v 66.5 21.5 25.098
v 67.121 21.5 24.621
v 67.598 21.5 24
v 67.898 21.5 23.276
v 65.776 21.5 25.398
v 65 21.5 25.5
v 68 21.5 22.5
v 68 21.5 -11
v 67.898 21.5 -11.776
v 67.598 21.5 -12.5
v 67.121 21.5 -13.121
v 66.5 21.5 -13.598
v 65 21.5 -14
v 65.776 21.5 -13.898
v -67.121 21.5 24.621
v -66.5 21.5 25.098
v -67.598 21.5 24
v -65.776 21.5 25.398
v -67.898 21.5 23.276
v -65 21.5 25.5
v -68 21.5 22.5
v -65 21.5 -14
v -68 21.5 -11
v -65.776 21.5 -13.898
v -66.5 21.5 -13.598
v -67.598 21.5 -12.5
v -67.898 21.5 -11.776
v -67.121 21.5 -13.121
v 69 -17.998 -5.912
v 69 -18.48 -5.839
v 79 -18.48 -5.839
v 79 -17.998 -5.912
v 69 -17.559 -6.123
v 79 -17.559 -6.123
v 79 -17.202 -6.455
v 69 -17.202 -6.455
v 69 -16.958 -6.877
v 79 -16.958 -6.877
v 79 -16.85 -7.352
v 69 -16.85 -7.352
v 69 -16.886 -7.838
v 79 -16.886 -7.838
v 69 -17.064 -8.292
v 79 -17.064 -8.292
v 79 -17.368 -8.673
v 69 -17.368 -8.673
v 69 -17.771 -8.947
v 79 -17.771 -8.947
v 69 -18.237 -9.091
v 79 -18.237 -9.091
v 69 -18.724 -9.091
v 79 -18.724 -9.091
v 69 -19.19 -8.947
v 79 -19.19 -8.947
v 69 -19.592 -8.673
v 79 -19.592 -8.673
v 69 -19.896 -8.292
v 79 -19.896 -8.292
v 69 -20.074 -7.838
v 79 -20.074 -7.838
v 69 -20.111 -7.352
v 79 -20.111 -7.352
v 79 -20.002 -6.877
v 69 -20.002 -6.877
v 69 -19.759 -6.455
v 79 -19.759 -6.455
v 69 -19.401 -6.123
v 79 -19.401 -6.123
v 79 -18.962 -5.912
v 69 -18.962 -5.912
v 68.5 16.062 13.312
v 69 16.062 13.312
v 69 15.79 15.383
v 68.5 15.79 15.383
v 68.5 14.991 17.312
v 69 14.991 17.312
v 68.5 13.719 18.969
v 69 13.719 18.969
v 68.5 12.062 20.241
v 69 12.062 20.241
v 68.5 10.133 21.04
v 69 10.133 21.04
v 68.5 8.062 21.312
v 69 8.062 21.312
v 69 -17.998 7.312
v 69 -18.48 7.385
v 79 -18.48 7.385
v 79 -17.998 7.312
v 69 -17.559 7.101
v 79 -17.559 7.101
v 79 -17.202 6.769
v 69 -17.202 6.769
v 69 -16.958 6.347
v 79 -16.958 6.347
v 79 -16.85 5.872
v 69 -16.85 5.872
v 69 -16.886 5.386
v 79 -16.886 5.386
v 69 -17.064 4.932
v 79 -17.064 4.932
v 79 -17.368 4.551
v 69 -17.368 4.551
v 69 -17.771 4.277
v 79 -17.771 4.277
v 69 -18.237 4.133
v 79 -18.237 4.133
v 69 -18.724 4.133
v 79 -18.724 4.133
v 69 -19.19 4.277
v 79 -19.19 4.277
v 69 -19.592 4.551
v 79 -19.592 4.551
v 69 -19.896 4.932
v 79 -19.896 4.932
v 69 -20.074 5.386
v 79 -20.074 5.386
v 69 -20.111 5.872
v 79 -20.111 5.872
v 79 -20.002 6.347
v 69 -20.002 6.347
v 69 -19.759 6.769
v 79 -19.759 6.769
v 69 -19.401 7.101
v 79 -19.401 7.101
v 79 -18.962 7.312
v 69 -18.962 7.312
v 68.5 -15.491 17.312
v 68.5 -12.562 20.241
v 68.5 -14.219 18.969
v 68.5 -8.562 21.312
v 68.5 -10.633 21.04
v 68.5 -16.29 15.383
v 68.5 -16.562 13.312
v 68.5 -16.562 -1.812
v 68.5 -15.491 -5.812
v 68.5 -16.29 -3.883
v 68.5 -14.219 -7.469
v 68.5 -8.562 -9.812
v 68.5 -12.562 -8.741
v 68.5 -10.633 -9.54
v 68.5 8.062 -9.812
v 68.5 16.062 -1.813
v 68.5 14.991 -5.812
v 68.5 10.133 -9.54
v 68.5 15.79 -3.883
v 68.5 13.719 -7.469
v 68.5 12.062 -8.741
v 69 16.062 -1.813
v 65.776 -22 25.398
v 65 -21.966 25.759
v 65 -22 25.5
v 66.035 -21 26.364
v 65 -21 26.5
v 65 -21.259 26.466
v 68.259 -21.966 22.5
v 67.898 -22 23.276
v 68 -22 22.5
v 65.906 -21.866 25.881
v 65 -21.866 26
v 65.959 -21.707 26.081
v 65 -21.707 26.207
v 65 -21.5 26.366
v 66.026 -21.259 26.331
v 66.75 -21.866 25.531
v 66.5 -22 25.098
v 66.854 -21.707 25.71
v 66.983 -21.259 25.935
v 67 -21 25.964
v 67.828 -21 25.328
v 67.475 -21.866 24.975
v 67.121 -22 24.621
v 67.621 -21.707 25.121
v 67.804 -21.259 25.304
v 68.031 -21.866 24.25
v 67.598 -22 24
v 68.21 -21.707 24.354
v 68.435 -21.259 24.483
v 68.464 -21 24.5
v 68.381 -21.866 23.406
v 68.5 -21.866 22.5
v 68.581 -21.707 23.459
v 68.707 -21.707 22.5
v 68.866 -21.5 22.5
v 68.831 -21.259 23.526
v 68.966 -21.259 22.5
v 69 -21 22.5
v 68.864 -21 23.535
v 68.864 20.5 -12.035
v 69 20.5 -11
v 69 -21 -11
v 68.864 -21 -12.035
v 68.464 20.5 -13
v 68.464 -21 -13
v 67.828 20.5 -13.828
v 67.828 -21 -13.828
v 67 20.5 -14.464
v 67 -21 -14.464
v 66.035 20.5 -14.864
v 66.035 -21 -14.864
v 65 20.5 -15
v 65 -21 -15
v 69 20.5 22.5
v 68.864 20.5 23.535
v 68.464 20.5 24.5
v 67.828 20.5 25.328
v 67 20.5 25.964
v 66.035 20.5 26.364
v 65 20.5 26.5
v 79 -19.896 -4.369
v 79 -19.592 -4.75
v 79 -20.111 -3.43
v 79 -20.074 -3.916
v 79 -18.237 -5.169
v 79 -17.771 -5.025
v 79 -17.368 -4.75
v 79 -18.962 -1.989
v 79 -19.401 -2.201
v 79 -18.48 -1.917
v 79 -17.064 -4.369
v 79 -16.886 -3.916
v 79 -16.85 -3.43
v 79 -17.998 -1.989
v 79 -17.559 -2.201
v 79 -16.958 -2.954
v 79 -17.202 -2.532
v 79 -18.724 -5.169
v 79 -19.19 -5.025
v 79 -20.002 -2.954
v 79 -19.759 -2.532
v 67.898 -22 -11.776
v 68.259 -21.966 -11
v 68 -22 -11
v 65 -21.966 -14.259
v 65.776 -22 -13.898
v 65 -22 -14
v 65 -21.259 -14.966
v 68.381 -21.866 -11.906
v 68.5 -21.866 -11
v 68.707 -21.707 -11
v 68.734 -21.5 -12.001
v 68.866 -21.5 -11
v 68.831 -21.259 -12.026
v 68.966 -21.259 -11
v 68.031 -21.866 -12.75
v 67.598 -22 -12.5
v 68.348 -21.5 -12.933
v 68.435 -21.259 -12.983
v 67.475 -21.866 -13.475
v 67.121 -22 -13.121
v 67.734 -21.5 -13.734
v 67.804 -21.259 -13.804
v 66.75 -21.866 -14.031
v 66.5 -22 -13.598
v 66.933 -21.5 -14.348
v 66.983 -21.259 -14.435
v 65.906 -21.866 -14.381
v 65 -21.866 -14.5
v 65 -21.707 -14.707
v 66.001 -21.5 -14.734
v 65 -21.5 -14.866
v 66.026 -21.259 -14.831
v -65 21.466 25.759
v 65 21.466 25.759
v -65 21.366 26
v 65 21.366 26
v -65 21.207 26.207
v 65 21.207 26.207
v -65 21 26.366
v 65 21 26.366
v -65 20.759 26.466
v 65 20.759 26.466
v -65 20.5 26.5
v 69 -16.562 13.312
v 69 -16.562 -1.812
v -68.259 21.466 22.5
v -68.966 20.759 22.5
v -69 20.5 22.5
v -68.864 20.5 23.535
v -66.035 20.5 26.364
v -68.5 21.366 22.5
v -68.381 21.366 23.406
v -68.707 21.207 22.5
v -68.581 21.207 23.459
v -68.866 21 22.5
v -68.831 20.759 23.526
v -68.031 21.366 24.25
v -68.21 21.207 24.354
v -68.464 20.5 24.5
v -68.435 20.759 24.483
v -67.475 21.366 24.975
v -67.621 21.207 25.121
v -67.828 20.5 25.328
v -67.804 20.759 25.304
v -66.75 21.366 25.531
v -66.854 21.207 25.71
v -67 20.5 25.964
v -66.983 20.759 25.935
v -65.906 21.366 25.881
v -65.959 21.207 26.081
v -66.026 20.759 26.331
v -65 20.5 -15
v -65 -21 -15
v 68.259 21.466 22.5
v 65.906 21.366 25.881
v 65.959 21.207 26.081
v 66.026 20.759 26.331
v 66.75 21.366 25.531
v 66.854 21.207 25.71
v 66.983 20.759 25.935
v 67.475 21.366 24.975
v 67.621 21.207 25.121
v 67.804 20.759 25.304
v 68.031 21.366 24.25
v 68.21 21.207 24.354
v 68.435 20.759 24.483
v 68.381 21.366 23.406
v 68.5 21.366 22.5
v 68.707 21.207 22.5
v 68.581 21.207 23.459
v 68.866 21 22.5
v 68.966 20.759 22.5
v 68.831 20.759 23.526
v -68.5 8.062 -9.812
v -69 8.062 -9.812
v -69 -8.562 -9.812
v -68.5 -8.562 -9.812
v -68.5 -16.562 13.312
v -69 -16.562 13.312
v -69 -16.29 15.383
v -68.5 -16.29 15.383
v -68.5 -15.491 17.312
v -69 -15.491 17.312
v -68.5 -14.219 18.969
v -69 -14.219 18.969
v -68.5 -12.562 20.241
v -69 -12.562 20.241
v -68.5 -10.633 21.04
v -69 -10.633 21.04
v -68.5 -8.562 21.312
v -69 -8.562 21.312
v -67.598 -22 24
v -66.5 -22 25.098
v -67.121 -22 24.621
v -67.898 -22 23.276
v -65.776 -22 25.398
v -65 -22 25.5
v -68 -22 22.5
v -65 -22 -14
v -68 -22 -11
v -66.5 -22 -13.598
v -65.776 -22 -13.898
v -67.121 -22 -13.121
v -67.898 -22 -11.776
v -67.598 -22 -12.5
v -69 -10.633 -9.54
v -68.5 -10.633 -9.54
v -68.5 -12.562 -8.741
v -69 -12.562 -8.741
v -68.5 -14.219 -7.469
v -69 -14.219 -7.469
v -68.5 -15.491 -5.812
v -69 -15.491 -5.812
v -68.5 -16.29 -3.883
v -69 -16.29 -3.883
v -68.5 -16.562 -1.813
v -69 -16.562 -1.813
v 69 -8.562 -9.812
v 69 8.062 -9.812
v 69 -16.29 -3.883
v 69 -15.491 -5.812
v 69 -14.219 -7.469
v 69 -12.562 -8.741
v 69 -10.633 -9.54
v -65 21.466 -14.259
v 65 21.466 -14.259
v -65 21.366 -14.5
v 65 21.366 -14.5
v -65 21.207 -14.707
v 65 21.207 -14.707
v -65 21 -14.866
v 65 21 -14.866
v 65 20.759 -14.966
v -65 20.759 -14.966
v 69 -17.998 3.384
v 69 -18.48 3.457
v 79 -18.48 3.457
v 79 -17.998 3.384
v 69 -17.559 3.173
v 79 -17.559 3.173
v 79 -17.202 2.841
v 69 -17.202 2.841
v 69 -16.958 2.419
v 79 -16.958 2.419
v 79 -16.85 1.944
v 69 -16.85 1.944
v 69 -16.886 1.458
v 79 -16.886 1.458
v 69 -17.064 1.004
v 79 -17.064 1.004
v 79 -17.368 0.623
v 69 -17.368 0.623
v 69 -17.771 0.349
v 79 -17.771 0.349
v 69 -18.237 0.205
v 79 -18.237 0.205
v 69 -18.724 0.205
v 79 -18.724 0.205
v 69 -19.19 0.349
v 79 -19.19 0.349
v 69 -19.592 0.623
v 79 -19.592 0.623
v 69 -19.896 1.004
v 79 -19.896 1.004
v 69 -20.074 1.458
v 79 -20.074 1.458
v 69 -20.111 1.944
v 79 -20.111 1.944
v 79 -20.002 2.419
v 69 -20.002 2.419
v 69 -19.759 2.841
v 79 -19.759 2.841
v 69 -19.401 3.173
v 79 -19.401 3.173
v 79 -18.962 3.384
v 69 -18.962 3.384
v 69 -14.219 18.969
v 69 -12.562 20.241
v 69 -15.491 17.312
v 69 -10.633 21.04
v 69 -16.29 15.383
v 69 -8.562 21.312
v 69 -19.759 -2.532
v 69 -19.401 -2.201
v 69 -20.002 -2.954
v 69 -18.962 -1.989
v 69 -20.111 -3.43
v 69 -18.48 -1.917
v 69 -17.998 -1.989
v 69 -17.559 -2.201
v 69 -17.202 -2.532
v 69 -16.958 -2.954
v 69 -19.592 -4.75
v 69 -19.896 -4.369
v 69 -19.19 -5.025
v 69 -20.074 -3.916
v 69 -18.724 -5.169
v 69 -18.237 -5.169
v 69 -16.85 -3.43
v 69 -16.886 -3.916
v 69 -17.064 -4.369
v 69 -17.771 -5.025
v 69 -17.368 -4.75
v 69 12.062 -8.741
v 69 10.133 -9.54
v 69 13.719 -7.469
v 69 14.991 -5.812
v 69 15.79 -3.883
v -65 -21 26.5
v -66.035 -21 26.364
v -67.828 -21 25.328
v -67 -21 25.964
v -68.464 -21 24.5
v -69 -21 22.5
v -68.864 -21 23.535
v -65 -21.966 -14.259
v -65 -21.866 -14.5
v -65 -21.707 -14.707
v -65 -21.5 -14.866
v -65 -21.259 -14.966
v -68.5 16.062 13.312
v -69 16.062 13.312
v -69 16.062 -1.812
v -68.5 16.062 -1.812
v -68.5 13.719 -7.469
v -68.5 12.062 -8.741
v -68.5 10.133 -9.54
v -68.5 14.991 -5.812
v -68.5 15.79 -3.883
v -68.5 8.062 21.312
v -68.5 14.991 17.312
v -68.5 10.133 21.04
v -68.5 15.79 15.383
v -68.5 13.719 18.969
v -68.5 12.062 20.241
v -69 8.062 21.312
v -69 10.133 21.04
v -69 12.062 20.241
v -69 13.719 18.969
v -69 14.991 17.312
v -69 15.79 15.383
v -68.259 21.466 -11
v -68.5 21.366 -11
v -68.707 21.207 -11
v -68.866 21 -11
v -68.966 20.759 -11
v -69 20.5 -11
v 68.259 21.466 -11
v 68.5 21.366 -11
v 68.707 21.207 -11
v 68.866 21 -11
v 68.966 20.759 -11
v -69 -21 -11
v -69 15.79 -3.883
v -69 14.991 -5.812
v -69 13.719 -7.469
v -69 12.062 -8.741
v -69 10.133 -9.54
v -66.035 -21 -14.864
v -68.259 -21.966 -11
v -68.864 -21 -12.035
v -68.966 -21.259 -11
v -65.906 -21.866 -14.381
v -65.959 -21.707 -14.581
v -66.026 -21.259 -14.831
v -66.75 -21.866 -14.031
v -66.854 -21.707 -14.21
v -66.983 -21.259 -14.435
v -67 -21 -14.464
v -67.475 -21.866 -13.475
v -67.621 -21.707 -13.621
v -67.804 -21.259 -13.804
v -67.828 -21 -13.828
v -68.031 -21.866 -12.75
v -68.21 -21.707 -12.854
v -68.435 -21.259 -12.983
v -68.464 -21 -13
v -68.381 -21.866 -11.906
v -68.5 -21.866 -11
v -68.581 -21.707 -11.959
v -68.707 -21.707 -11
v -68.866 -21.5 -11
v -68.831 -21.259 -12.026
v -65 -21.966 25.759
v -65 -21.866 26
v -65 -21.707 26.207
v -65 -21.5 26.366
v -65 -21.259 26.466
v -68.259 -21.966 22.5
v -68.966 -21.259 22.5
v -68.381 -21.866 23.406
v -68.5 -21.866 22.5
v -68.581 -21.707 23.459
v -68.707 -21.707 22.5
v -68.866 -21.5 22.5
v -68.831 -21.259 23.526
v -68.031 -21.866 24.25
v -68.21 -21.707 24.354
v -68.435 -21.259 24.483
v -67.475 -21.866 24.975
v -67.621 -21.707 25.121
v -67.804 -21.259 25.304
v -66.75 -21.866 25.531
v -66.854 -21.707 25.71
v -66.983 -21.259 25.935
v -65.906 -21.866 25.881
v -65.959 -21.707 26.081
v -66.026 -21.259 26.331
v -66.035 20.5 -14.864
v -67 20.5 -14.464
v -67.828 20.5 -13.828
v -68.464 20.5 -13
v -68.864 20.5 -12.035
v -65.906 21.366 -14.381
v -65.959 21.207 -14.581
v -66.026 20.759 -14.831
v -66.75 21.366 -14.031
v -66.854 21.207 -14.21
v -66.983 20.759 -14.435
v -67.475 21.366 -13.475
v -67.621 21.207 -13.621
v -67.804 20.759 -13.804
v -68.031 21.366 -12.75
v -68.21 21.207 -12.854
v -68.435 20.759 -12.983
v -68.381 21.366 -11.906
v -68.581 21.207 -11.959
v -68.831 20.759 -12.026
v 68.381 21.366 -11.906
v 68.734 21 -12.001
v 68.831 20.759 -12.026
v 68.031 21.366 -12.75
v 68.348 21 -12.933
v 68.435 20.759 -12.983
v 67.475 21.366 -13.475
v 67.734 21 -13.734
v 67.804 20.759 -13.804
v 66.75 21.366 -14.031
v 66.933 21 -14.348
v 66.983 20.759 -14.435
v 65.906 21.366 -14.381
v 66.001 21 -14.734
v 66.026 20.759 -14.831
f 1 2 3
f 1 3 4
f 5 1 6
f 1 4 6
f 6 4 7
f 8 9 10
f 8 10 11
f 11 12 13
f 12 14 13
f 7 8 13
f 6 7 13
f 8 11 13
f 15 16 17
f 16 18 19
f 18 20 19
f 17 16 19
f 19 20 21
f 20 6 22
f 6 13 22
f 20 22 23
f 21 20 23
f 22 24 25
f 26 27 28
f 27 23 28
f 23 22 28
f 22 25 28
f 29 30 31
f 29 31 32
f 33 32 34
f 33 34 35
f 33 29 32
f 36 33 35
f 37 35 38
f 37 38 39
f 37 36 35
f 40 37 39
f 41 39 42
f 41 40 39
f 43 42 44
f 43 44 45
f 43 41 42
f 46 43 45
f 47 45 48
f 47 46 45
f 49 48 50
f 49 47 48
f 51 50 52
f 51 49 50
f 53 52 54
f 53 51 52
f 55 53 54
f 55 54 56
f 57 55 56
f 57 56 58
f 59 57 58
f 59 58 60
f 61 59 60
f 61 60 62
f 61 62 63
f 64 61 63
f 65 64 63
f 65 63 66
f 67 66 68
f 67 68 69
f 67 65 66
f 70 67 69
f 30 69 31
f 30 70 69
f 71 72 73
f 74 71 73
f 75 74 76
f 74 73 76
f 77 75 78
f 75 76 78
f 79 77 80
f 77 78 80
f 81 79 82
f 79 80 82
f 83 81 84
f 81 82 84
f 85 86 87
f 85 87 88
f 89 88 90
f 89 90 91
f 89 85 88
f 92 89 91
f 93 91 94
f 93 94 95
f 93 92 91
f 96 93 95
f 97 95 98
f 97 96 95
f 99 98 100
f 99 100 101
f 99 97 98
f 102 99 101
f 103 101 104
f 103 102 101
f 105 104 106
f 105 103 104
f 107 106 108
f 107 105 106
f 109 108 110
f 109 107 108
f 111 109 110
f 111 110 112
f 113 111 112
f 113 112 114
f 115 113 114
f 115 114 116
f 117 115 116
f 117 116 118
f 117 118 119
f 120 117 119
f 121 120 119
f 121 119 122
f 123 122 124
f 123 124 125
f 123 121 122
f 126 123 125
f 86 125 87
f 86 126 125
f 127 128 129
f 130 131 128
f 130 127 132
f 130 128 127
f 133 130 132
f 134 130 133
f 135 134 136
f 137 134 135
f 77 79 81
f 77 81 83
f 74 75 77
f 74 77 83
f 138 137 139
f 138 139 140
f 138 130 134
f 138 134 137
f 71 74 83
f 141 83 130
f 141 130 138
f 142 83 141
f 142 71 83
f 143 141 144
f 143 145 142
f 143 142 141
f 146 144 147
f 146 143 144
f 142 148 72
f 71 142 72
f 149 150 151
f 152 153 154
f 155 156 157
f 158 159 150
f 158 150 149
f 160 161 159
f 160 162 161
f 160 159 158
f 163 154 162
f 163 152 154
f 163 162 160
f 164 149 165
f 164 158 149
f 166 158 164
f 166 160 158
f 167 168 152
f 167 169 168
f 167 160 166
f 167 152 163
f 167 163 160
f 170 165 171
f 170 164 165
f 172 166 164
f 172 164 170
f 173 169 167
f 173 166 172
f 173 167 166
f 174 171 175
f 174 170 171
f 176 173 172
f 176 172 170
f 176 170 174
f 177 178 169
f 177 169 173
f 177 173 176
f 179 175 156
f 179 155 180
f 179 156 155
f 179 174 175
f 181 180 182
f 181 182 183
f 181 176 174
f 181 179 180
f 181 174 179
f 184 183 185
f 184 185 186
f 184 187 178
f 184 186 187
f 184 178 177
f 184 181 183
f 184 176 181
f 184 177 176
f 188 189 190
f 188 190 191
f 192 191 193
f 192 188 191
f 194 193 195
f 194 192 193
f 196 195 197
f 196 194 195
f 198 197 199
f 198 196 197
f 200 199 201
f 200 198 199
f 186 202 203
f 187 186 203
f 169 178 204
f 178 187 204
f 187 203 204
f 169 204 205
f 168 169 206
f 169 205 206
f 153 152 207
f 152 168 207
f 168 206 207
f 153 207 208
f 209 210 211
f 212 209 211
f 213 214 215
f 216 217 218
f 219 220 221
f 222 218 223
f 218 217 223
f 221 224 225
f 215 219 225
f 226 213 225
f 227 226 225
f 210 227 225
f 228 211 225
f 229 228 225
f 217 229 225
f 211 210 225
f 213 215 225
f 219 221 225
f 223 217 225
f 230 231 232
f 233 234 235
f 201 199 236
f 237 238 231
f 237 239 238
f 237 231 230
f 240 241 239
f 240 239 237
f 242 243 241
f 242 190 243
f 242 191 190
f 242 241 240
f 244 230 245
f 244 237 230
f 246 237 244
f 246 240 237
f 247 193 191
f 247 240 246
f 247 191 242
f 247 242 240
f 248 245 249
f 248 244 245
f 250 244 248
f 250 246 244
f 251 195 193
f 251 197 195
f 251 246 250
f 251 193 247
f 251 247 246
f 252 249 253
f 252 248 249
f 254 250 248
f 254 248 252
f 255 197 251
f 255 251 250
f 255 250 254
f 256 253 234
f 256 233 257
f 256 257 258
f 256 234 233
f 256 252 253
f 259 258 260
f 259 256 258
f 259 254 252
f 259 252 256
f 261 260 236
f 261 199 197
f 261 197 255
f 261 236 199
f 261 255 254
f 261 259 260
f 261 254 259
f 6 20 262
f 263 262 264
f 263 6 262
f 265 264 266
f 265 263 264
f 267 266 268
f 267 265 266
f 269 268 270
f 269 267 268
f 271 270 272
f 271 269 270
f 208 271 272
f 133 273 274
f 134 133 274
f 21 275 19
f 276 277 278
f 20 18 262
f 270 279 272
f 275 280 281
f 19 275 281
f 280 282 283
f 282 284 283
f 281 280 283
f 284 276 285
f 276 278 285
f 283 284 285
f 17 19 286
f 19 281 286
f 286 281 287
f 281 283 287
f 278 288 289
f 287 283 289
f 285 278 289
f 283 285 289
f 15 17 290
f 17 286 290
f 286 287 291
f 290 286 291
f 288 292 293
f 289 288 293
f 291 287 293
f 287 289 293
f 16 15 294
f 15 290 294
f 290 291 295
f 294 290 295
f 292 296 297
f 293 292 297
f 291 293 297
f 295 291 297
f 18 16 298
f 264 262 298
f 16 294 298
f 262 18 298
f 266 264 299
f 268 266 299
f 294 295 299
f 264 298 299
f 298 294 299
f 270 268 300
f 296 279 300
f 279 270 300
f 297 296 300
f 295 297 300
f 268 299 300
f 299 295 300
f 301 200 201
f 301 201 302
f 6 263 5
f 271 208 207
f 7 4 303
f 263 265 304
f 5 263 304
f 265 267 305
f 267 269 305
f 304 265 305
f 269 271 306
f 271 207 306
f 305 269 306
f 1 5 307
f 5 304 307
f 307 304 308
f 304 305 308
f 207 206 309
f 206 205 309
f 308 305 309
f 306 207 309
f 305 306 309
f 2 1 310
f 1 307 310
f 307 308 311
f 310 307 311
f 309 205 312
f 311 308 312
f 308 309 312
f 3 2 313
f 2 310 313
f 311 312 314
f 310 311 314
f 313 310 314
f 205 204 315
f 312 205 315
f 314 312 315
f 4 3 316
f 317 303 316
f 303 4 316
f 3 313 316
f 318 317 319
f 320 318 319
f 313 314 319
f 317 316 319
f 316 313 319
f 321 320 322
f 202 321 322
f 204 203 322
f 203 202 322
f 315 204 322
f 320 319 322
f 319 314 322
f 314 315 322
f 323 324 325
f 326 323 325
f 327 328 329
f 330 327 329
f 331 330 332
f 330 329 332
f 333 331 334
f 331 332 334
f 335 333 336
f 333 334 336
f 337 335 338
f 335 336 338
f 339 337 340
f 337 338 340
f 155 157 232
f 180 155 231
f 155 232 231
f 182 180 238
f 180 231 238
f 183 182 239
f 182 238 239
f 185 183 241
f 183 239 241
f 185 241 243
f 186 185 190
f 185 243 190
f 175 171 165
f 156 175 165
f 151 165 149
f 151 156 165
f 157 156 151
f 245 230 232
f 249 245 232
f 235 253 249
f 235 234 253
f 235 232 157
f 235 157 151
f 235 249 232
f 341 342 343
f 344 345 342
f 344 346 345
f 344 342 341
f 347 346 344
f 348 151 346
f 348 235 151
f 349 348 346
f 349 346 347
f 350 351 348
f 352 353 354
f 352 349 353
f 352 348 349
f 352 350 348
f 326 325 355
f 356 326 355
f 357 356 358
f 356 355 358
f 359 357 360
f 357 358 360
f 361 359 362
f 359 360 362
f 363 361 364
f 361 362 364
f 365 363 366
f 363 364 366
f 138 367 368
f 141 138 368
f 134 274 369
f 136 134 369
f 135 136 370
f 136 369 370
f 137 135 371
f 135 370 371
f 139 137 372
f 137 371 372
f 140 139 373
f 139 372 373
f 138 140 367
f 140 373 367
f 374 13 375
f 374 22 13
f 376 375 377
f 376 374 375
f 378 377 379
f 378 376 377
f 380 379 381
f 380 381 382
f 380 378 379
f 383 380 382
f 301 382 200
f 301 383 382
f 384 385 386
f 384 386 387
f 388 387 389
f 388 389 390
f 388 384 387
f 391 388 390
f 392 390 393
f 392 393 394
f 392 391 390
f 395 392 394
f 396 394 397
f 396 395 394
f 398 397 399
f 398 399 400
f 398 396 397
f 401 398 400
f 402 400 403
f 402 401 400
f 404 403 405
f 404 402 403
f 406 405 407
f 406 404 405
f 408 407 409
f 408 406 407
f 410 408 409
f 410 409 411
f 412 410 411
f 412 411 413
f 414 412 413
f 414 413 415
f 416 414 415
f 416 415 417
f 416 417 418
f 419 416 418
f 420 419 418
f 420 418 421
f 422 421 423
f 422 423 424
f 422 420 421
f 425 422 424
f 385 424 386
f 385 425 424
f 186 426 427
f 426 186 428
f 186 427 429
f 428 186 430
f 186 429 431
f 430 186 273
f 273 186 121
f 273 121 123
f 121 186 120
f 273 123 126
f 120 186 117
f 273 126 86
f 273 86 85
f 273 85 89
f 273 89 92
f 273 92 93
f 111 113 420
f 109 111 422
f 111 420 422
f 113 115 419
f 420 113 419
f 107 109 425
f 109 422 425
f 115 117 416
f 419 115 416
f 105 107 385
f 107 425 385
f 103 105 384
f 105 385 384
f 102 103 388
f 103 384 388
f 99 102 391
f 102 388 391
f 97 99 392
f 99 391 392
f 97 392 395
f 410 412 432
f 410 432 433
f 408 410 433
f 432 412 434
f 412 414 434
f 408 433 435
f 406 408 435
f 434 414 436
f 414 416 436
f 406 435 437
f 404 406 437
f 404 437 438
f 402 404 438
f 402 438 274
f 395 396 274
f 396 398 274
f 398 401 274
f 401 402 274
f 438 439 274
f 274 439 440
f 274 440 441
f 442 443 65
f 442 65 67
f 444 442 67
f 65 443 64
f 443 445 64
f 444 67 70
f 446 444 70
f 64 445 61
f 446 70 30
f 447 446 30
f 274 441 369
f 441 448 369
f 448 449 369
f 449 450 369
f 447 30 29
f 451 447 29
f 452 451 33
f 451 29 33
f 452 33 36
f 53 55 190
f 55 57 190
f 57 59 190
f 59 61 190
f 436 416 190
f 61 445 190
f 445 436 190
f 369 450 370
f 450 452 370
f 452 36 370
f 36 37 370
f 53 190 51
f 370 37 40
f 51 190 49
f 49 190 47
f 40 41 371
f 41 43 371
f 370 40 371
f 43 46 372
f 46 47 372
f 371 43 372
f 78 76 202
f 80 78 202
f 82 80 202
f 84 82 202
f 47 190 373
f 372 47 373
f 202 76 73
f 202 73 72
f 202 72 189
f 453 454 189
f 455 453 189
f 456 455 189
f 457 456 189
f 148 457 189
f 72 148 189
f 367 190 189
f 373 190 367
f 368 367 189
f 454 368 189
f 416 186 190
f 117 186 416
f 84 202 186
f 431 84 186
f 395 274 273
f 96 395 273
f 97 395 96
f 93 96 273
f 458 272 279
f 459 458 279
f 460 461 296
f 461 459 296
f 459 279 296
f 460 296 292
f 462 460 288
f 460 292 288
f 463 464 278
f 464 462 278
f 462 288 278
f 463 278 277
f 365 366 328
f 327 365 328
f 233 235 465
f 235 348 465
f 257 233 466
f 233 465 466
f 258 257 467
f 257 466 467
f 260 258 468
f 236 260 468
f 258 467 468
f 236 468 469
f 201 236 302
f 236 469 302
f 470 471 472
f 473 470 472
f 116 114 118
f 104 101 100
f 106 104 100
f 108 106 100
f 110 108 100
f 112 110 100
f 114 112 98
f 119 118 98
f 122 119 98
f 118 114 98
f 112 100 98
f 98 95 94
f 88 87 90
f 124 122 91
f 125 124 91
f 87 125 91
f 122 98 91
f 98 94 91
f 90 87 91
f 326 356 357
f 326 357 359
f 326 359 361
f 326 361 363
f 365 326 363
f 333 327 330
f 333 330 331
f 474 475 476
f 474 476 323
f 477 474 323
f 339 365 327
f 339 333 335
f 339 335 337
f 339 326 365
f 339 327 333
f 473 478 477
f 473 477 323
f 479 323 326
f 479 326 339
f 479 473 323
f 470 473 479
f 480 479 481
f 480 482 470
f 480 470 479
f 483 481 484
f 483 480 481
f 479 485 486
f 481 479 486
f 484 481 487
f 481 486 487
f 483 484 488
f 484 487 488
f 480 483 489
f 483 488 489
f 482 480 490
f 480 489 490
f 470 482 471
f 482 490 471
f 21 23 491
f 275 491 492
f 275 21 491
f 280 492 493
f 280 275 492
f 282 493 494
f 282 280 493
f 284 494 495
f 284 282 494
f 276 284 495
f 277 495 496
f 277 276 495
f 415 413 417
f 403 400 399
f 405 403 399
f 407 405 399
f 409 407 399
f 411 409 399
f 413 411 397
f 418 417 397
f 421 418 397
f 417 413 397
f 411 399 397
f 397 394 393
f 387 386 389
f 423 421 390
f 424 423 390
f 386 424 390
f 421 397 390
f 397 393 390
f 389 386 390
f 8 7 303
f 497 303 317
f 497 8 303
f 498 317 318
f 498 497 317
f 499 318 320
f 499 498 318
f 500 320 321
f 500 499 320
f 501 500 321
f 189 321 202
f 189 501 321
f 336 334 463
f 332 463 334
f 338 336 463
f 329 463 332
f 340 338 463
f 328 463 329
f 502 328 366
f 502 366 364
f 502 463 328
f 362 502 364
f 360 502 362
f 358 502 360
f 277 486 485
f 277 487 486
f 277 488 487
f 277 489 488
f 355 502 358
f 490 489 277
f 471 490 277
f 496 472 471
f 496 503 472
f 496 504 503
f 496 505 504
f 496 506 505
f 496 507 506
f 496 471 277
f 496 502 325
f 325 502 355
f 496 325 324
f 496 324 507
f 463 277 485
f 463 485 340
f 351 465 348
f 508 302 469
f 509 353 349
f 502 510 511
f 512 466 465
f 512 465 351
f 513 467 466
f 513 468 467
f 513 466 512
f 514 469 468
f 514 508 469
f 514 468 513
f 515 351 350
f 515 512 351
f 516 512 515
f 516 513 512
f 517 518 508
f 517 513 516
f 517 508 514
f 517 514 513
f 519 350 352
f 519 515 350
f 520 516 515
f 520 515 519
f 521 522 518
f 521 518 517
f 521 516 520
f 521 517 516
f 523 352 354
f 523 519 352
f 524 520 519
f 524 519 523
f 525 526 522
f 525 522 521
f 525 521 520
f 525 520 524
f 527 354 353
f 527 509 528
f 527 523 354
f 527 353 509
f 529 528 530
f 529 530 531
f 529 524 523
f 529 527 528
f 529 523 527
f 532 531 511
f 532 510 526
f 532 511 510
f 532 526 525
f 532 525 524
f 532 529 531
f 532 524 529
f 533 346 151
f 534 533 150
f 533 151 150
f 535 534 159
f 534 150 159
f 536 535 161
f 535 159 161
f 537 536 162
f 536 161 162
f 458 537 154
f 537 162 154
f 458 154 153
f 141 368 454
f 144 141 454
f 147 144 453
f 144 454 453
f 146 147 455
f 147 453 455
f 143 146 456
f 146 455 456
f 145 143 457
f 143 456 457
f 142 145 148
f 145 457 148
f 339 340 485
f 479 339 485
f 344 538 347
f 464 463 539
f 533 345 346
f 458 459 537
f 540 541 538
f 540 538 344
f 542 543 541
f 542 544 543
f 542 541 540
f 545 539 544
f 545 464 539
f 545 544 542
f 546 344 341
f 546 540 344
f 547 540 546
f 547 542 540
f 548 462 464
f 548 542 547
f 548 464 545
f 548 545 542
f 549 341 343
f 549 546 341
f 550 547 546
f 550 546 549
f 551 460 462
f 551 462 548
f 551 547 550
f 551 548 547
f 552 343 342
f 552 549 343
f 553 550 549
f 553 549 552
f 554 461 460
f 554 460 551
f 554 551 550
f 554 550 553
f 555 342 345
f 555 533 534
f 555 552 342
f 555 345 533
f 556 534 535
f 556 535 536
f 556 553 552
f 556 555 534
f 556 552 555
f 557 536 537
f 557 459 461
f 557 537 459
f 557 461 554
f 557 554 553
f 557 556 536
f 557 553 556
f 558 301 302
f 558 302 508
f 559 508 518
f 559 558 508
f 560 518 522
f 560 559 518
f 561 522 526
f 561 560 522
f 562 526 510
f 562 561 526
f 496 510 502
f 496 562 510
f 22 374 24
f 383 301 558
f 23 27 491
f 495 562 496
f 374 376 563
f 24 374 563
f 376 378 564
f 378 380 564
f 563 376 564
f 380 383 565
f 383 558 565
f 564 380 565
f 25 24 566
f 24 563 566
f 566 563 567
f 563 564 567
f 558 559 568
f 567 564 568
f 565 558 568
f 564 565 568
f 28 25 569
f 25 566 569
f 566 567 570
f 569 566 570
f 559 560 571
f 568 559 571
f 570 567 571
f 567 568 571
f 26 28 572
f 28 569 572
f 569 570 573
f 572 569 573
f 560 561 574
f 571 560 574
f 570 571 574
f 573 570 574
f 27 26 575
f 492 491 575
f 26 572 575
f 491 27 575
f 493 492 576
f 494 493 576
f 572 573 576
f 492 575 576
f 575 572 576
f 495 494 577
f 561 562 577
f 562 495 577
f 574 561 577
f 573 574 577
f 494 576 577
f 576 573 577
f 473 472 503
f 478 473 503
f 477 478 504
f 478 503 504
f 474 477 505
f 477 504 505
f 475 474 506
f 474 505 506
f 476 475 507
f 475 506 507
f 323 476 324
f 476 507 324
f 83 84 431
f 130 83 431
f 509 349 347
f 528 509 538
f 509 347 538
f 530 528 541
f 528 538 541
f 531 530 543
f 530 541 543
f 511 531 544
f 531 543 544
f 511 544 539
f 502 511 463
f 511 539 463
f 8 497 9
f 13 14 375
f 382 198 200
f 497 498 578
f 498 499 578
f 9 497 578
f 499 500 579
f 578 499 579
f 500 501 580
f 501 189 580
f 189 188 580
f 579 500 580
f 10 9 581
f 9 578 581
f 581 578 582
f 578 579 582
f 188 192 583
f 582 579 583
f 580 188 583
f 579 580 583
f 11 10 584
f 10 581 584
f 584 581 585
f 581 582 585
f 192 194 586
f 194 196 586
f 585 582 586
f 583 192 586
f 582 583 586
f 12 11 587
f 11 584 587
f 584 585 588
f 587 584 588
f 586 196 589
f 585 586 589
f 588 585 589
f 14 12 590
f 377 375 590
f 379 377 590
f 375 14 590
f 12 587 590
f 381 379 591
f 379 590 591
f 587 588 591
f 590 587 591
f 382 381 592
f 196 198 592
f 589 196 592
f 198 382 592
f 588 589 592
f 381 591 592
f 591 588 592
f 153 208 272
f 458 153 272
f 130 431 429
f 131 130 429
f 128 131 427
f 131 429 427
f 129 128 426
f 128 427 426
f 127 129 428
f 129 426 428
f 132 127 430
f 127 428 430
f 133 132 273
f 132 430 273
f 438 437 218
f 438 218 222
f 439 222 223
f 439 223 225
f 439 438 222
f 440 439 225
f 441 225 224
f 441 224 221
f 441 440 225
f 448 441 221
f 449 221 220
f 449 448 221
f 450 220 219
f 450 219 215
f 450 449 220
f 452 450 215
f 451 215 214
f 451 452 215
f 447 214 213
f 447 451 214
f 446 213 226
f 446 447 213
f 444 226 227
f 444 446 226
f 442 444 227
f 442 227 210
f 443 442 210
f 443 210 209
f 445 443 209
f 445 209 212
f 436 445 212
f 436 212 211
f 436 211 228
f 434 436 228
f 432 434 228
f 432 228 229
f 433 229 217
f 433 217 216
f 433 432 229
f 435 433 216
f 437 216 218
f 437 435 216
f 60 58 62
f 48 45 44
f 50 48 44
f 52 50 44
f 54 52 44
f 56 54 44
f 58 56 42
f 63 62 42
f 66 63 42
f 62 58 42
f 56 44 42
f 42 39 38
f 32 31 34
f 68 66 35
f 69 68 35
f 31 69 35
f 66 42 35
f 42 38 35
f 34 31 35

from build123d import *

# Parameters (mm, degrees)
SKETCH1_W           = 138
SKETCH1_H           = 43.5
BOSS_EXTRUDE1_DEPTH = 41.5
CUT_EXTRUDE1_DEPTH  = 0.5
CUT_EXTRUDE2_DEPTH  = 0.5
FILLET1_R           = 4
FILLET2_R           = 1
SKETCH5_R           = 1.635
BOSS_EXTRUDE2_DEPTH = 10


with BuildPart() as part:
    # Sketch1 → Boss-Extrude1 (new body)
    with BuildSketch(Plane(origin=(0, 0, -15), x_dir=(-1, 0, 0), z_dir=(0, 0, -1))):
        with Locations((0, -0.25)):
            Rectangle(SKETCH1_W, SKETCH1_H)
    extrude(amount=-BOSS_EXTRUDE1_DEPTH)

    # Sketch2 → Cut-Extrude1 (cut)
    with BuildSketch(Plane(origin=(69, 0, 0), x_dir=(0, 0, -1), z_dir=(1, 0, 0))):
        with BuildLine():
            Line((-21.3125, 8.0625), (-21.3125, -8.5625))
            ThreePointArc((-21.3125, -8.5625), (-18.969354249, -14.219354249), (-13.3125, -16.5625))
            Line((-13.3125, -16.5625), (1.8125, -16.5625))
            ThreePointArc((1.8125, -16.5625), (7.469354249, -14.219354249), (9.8125, -8.5625))
            Line((9.8125, -8.5625), (9.8125, 8.0625))
            ThreePointArc((9.8125, 8.0625), (7.469354249, 13.719354249), (1.8125, 16.0625))
            Line((1.8125, 16.0625), (-13.3125, 16.0625))
            ThreePointArc((-13.3125, 16.0625), (-18.969354249, 13.719354249), (-21.3125, 8.0625))
        make_face()
    extrude(amount=-CUT_EXTRUDE1_DEPTH, mode=Mode.SUBTRACT)

    # Sketch3 → Cut-Extrude2 (cut)
    with BuildSketch(Plane.ZY.offset(69)):
        with BuildLine():
            Line((13.3125, 16.0625), (-1.8125, 16.0625))
            ThreePointArc((-1.8125, 16.0625), (-7.469354249, 13.719354249), (-9.8125, 8.0625))
            Line((-9.8125, 8.0625), (-9.8125, -8.5625))
            ThreePointArc((-9.8125, -8.5625), (-7.469354249, -14.219354249), (-1.8125, -16.5625))
            Line((-1.8125, -16.5625), (13.3125, -16.5625))
            ThreePointArc((13.3125, -16.5625), (18.969354249, -14.219354249), (21.3125, -8.5625))
            Line((21.3125, -8.5625), (21.3125, 8.0625))
            ThreePointArc((21.3125, 8.0625), (18.969354249, 13.719354249), (13.3125, 16.0625))
        make_face()
    extrude(amount=-CUT_EXTRUDE2_DEPTH, mode=Mode.SUBTRACT)

    # Fillet1
    fillet1_edges = [part.edges().sort_by_distance(p)[0] for p in [
        (-69, -0.25, 26.5),
        (69, -0.25, 26.5),
        (-69, -0.25, -15),
        (69, -0.25, -15),
    ]]
    fillet(fillet1_edges, radius=FILLET1_R)

    # Fillet2
    fillet2_edges = [part.edges().sort_by_distance(p)[0] for p in [
        (0, -22, -15),
        (0, 21.5, -15),
        (-69, 21.5, 5.75),
        (0, 21.5, 26.5),
        (69, 21.5, 5.75),
        (67.828427125, 21.5, 25.328427125),
        (67.828427125, 21.5, -13.828427125),
        (-67.828427125, 21.5, 25.328427125),
        (-67.828427125, 21.5, -13.828427125),
        (-69, -22, 5.75),
        (69, -22, 5.75),
        (0, -22, 26.5),
        (67.828427125, -22, 25.328427125),
        (67.828427125, -22, -13.828427125),
        (-67.828427125, -22, 25.328427125),
        (-67.828427125, -22, -13.828427125),
    ]]
    fillet(fillet2_edges, radius=FILLET2_R)

    # Sketch5 → Boss-Extrude2 (add)
    with BuildSketch(Plane.ZY.offset(-69)):
        with Locations((-7.474307757, -18.480417137)):
            Circle(SKETCH5_R)
        with Locations((-3.551789479, -18.480417137)):
            Circle(SKETCH5_R)
        with Locations((1.821805343, -18.480417137)):
            Circle(SKETCH5_R)
        with Locations((5.75, -18.480417137)):
            Circle(SKETCH5_R)
    extrude(amount=-BOSS_EXTRUDE2_DEPTH)


solid = part.part
